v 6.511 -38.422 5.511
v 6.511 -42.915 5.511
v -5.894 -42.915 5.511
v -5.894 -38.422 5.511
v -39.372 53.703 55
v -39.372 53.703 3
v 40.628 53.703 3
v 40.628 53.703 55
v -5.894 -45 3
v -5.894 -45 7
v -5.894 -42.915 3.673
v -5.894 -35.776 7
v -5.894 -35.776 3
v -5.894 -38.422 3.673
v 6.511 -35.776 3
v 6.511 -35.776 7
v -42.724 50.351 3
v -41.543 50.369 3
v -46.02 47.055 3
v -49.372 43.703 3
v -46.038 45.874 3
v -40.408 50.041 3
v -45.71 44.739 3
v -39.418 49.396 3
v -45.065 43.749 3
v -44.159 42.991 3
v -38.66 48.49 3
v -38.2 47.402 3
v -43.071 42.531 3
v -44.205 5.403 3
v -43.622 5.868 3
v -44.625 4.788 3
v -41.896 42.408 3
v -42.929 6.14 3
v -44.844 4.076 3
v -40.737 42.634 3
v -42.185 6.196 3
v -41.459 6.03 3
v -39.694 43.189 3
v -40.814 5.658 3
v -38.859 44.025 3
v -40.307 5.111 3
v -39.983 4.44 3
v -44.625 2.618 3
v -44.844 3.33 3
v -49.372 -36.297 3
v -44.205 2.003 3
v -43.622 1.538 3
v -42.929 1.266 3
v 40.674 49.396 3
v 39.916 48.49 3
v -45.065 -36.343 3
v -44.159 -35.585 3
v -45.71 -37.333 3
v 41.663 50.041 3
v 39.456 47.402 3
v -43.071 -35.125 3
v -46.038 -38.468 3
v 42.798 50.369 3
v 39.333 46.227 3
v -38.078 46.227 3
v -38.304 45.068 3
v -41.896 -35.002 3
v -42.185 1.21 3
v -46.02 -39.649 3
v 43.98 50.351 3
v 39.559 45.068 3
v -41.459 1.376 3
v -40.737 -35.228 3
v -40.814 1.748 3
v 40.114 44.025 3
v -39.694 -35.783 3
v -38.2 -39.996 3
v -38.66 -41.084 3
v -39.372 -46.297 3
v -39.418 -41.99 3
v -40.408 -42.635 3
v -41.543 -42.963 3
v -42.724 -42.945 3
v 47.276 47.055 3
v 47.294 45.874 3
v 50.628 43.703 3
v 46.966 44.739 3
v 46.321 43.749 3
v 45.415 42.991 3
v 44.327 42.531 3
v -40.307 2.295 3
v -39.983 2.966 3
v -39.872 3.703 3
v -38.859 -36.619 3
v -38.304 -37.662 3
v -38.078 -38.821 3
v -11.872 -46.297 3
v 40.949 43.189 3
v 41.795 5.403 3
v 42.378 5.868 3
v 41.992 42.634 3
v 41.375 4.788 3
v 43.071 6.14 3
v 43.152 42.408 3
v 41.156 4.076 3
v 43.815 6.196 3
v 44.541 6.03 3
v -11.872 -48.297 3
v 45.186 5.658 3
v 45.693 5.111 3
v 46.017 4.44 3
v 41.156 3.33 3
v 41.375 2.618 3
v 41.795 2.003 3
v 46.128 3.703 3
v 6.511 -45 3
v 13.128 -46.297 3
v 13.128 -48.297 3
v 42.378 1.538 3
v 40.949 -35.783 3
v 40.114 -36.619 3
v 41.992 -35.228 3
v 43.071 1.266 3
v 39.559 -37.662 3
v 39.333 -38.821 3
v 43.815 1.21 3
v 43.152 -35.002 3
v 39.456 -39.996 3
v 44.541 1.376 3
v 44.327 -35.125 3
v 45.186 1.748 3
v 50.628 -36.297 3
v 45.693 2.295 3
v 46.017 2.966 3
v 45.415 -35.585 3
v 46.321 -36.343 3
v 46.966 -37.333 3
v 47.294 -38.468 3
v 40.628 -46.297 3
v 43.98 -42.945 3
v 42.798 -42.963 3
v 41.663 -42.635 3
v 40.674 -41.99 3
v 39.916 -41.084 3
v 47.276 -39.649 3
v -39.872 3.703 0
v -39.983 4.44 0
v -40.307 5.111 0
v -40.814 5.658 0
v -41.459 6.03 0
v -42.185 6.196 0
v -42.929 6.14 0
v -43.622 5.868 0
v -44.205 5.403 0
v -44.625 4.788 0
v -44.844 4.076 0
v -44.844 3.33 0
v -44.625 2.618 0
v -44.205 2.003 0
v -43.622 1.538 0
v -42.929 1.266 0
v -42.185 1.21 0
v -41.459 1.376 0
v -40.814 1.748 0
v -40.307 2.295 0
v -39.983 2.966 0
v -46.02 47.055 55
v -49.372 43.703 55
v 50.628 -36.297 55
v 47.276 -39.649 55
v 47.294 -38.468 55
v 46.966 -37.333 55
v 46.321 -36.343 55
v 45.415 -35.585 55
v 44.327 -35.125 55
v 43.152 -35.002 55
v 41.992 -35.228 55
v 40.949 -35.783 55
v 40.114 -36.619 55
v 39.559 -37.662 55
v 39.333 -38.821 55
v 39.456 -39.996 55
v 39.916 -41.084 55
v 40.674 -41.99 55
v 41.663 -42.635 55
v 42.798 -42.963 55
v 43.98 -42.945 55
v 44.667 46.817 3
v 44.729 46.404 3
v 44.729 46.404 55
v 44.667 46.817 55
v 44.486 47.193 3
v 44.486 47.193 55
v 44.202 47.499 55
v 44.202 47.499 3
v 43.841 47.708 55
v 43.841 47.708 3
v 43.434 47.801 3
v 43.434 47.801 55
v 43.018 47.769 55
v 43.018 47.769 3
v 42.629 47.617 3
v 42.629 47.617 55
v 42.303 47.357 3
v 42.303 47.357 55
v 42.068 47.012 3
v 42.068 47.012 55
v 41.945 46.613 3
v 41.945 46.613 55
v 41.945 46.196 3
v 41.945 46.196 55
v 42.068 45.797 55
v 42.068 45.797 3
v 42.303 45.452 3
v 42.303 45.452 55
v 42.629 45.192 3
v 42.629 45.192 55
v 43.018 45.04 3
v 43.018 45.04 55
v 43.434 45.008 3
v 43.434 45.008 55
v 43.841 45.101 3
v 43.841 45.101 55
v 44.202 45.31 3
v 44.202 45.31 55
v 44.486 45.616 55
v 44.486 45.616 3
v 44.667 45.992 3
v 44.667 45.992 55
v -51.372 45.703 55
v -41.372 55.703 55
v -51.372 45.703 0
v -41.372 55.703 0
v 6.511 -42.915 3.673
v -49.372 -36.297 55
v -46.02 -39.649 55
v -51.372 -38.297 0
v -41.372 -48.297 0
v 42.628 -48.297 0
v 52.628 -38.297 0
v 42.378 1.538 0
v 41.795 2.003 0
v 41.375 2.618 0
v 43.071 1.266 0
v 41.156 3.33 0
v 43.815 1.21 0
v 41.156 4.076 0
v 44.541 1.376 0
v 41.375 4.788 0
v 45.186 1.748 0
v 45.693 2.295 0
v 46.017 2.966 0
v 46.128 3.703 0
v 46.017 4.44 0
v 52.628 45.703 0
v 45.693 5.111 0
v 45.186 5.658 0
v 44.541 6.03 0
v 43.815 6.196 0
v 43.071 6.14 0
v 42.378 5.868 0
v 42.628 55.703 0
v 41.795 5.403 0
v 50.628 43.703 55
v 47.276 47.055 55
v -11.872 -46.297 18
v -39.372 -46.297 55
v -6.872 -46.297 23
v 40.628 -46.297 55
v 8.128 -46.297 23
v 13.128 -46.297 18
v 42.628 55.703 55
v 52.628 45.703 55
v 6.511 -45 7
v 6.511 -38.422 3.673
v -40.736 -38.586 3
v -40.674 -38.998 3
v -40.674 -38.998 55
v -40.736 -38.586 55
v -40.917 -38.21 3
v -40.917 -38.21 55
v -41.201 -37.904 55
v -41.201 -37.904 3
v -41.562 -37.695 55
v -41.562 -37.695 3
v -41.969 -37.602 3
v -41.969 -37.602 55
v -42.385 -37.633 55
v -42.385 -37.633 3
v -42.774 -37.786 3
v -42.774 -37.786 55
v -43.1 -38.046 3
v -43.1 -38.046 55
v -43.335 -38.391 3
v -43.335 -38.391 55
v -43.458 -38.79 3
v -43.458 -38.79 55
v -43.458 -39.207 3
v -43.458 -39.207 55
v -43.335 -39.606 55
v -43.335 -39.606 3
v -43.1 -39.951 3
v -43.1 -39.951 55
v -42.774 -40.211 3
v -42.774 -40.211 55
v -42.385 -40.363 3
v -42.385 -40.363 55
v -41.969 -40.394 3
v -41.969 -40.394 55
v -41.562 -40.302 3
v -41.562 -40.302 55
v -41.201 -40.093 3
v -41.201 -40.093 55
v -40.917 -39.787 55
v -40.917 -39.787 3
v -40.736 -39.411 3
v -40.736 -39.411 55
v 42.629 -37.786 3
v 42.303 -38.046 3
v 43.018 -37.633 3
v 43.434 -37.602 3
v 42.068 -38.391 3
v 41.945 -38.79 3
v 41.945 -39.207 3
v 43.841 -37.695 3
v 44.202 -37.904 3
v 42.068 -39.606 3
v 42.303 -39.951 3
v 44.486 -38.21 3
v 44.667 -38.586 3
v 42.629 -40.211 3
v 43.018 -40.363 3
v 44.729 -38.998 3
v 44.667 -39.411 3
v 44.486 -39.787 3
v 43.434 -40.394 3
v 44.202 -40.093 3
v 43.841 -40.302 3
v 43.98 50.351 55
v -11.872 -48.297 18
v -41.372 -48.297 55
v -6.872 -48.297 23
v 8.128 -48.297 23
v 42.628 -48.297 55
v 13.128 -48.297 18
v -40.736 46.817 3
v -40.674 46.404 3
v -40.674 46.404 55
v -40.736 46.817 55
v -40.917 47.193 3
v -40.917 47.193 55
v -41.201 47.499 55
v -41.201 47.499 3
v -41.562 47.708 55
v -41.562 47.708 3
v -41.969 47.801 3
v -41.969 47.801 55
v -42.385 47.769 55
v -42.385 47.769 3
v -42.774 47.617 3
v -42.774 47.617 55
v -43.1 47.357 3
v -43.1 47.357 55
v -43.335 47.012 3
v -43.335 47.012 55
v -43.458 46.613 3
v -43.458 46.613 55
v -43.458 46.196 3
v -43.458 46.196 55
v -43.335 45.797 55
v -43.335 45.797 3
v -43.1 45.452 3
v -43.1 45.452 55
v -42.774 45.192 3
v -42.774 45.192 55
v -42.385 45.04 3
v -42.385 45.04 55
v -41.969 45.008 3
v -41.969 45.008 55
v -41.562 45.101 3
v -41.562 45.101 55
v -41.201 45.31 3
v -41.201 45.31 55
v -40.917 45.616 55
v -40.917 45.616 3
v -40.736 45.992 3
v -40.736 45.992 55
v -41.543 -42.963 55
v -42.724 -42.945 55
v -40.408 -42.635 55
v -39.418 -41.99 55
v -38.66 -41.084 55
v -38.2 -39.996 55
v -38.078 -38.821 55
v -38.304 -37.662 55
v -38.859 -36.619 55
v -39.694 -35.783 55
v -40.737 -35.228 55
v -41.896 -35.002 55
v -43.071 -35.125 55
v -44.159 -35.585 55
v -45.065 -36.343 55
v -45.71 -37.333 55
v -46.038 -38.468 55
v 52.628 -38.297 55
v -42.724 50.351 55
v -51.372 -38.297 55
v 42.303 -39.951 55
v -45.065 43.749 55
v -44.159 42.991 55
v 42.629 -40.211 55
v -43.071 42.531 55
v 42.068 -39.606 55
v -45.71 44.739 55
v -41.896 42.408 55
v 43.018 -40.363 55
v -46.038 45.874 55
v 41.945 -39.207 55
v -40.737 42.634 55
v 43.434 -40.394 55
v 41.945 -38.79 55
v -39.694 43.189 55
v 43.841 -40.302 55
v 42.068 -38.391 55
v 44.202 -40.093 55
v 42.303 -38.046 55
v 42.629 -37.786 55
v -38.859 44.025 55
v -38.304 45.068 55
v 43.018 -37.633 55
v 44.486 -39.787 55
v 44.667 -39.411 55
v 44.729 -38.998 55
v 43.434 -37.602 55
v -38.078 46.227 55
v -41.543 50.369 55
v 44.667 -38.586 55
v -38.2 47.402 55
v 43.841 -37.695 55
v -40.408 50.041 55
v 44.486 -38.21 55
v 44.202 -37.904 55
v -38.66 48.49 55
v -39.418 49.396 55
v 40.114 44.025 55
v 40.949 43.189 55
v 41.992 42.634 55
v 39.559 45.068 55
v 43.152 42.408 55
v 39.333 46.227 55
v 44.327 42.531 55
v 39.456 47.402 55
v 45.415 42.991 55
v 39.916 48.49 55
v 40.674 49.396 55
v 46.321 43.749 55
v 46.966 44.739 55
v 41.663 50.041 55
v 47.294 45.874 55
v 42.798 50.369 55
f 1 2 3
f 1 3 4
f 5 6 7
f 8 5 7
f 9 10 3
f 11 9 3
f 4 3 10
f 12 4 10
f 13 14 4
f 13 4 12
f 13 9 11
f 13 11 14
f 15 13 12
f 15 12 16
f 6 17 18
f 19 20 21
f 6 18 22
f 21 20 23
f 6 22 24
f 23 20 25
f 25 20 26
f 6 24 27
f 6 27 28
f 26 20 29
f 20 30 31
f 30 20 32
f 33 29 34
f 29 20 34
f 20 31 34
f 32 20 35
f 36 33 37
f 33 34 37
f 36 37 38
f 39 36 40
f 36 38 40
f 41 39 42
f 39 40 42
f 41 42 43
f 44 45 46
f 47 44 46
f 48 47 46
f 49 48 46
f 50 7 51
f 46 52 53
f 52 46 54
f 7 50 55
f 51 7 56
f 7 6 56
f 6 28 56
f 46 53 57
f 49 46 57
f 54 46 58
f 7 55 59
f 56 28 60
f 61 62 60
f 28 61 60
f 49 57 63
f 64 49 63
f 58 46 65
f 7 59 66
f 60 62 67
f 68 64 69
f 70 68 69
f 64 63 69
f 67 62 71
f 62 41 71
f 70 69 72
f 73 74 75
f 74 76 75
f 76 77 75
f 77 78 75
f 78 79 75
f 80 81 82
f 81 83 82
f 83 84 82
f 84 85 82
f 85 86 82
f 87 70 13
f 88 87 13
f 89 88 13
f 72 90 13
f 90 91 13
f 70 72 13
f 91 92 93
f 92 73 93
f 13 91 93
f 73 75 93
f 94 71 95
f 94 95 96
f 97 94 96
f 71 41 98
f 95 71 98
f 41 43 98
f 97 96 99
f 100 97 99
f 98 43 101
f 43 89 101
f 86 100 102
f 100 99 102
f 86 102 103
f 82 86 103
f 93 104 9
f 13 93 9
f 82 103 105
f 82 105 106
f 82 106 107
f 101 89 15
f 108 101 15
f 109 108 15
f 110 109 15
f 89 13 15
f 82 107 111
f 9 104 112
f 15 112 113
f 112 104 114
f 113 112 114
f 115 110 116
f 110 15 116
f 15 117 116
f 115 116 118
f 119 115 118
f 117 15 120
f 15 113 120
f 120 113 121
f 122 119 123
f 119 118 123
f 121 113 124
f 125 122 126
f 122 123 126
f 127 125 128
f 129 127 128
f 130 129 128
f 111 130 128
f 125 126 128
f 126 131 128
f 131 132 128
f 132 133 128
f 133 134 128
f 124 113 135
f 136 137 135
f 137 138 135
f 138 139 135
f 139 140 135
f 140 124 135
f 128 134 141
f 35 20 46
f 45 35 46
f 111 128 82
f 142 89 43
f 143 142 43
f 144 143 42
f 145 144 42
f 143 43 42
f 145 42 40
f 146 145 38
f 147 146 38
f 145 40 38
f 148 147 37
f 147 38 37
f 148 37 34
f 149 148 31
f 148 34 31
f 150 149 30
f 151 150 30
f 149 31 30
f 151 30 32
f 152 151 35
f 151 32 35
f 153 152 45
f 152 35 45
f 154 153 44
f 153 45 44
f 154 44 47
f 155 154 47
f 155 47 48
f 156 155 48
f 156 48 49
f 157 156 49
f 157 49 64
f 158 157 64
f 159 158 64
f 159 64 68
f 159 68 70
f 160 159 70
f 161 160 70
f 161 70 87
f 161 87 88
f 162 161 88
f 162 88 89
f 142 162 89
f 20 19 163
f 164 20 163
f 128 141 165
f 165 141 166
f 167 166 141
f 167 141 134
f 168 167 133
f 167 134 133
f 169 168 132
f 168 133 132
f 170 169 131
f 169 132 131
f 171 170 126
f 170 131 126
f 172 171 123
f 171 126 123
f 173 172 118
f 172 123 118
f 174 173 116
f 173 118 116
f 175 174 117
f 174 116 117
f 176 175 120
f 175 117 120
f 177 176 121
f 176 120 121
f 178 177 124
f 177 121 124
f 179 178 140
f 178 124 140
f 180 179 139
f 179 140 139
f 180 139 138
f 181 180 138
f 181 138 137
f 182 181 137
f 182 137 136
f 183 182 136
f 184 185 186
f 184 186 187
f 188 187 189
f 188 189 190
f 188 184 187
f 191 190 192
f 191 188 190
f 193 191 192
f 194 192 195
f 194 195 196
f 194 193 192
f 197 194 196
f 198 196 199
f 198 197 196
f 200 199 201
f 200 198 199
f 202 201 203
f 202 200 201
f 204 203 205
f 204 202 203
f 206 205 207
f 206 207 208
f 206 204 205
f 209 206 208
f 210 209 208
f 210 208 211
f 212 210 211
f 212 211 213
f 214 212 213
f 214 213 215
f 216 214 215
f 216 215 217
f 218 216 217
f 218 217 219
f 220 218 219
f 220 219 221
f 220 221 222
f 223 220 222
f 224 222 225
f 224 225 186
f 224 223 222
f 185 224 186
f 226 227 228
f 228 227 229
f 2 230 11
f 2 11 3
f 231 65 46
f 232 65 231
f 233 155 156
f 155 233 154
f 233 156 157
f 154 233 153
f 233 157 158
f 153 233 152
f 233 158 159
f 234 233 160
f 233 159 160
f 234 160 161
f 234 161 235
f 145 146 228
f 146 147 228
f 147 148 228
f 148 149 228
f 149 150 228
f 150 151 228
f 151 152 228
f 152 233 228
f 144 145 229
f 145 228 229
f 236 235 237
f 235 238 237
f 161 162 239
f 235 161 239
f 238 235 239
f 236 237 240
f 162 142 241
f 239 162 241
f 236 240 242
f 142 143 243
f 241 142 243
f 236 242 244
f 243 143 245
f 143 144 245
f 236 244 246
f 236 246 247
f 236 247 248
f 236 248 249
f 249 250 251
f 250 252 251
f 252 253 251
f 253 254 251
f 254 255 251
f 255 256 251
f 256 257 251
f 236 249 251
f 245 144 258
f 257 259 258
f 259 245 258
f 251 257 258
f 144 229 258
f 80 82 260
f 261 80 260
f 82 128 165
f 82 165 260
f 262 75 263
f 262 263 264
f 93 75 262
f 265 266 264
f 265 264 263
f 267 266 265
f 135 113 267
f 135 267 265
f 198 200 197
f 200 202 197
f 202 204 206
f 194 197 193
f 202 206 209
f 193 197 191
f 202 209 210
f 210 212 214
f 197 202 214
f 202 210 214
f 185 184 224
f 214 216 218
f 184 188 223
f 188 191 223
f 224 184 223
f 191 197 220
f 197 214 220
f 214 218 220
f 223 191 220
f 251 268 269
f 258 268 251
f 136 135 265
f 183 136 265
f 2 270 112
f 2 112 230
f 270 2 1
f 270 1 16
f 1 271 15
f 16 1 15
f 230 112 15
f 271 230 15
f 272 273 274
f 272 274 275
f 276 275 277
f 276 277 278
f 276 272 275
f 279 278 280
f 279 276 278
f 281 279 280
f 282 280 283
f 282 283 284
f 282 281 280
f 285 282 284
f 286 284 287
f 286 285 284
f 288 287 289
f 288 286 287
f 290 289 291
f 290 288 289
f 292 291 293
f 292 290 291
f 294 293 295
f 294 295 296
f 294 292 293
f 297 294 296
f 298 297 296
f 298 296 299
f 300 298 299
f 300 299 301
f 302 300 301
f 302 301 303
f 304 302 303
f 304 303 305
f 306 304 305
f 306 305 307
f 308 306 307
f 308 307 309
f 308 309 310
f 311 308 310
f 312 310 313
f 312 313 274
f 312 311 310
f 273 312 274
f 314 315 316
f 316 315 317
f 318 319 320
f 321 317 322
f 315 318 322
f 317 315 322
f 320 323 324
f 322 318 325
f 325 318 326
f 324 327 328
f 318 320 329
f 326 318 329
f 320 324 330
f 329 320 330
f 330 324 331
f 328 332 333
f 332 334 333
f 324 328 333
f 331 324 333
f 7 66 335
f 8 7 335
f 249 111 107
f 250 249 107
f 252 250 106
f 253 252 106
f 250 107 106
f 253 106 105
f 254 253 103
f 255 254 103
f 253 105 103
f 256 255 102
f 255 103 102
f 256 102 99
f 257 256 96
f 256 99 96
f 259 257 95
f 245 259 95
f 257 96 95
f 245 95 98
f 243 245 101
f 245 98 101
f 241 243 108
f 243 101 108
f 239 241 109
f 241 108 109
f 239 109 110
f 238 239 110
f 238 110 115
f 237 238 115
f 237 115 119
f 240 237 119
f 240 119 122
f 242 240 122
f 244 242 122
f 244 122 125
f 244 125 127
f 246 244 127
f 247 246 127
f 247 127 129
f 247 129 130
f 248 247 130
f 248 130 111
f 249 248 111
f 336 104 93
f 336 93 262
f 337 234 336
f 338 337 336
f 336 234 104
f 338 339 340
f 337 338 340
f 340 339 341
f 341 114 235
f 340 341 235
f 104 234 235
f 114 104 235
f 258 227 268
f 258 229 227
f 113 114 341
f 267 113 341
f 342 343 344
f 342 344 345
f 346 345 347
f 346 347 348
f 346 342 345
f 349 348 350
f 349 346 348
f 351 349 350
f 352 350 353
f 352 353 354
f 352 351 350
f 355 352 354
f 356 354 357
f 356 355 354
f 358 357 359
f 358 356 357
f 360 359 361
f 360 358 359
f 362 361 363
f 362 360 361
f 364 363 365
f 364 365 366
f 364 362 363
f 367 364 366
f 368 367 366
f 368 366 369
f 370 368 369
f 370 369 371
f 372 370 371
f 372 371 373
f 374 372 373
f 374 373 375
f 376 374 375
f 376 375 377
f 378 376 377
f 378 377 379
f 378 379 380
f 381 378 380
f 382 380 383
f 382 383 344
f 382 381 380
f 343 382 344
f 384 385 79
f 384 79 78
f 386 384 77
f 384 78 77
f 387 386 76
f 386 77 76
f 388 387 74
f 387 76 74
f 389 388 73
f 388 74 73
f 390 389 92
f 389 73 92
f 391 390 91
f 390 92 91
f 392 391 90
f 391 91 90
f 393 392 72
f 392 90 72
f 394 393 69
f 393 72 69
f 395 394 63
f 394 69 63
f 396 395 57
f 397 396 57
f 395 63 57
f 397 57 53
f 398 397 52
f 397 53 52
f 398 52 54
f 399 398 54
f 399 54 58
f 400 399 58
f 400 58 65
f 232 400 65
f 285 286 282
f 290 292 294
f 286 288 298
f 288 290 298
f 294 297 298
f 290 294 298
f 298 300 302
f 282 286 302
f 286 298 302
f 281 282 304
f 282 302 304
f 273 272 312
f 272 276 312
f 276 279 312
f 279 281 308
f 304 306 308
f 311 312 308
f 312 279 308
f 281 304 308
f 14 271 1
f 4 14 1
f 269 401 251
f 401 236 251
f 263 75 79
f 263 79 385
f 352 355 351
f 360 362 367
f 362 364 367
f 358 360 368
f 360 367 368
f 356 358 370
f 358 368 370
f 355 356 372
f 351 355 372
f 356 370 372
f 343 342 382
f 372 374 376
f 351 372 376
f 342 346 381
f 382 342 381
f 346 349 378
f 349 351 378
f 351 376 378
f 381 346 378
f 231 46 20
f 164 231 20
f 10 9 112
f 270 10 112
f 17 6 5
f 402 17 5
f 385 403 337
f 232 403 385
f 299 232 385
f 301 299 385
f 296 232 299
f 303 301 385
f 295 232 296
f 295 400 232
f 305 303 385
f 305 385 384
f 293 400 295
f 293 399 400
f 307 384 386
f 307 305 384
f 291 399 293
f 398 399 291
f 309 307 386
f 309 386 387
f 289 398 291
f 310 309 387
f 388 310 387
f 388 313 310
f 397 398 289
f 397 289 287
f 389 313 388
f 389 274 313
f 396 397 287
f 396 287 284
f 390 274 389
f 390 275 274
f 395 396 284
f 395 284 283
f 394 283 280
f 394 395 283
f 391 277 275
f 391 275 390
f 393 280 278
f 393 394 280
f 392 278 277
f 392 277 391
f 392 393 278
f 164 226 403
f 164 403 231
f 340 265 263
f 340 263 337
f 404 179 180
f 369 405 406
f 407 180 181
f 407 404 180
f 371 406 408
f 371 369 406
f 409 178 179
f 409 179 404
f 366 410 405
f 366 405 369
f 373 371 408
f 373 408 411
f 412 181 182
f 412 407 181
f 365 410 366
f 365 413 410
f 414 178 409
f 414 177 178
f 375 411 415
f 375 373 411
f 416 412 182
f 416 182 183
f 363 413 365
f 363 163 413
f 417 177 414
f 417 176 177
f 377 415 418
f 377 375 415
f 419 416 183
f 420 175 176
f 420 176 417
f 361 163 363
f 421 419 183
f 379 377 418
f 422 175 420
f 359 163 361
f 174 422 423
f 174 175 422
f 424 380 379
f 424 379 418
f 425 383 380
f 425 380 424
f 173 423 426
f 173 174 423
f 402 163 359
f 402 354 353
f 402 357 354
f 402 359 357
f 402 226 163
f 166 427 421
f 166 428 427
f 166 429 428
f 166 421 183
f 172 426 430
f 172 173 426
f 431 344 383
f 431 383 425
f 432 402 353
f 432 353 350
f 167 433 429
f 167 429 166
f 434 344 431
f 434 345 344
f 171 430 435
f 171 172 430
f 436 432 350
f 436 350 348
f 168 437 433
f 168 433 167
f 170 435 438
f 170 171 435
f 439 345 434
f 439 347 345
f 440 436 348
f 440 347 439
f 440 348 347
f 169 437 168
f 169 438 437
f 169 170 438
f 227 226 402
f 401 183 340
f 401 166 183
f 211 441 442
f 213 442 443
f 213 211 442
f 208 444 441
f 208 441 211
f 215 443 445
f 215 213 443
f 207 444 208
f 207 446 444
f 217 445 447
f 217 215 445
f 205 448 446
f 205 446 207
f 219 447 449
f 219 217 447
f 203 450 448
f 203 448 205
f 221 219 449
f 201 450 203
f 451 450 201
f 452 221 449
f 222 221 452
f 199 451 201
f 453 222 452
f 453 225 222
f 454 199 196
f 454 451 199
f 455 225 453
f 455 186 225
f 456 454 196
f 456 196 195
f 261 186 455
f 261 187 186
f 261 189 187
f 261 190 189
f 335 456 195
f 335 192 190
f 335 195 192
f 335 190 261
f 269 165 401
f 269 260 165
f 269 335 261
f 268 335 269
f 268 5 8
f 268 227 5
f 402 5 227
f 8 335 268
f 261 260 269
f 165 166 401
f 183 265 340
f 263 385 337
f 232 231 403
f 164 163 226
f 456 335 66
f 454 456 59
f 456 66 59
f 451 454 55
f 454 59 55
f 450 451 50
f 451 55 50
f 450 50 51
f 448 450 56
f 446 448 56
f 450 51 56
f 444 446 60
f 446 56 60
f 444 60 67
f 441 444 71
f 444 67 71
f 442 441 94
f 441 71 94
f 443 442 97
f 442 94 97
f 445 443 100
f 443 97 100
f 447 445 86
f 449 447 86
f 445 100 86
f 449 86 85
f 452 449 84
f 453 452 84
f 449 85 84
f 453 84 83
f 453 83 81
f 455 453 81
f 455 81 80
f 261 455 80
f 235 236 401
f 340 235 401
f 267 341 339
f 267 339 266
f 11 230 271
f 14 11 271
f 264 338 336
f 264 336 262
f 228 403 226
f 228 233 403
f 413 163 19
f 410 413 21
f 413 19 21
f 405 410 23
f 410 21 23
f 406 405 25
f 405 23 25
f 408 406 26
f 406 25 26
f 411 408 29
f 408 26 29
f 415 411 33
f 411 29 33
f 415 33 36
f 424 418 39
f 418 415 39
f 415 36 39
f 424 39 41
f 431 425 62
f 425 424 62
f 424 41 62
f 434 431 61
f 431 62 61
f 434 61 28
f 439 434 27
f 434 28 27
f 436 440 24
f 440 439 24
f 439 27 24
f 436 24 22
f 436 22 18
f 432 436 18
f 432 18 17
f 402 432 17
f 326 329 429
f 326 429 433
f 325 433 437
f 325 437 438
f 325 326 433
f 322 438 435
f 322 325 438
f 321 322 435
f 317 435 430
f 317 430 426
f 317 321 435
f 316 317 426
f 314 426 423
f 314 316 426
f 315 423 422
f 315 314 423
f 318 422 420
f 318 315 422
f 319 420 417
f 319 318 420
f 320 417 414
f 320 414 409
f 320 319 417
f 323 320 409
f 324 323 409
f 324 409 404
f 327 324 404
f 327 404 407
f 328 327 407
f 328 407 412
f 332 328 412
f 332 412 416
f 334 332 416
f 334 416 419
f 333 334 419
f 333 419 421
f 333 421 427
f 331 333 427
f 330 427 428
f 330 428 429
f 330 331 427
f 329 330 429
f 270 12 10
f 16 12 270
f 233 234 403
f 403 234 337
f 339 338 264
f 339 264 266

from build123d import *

# Parameters (mm, degrees)
SKETCH_W        = 104
SKETCH_H        = 104
PAD_DEPTH       = 3
SKETCH001_W     = 104
SKETCH001_H     = 104
SKETCH001_W_2   = 100
SKETCH001_H_2   = 100
PAD001_DEPTH    = 52
CHAMFER_SIZE    = 10
SKETCH003_W     = 25
SKETCH003_H     = 20
POCKET_DEPTH    = 5
CHAMFER001_SIZE = 5
SKETCH004_W     = 12.404821
SKETCH004_H     = 9.224227
PAD002_DEPTH    = 4
SKETCH005_R     = 4
SKETCH005_R_2   = 1.4
PAD003_DEPTH    = 52
SKETCH002_R     = 2.5
POCKET001_DEPTH = 5
SKETCH006_W     = 4.492853
SKETCH006_H     = 1.837998
POCKET002_DEPTH = 25


with BuildPart() as part:
    # Sketch → Pad (new body)
    with BuildSketch(Plane.XY):
        with Locations((0.627717, 3.703031)):
            Rectangle(SKETCH_W, SKETCH_H)
    extrude(amount=PAD_DEPTH)

    # Sketch001 → Pad001 (new body)
    with BuildSketch(Plane.XY.offset(3)):
        with Locations((0.627717, 3.703031)):
            Rectangle(SKETCH001_W, SKETCH001_H)
        with Locations((0.627717, 3.703031)):
            Rectangle(SKETCH001_W_2, SKETCH001_H_2, mode=Mode.SUBTRACT)
    extrude(amount=PAD001_DEPTH)

    # Chamfer
    chamfer_edges = [part.edges().sort_by_distance(p)[0] for p in [
        (-51.372283, 55.703031, 27.5),
        (52.627717, 55.703031, 27.5),
        (-51.372283, -48.296969, 27.5),
        (52.627717, -48.296969, 27.5),
        (-49.372283, 53.703031, 29),
        (50.627717, 53.703031, 29),
        (-49.372283, -46.296969, 29),
        (50.627717, -46.296969, 29),
    ]]
    chamfer(chamfer_edges, length=CHAMFER_SIZE)

    # Sketch003 → Pocket (cut)
    with BuildSketch(Plane.XZ.offset(48.296969)):
        with Locations((0.627717, 13)):
            Rectangle(SKETCH003_W, SKETCH003_H)
    extrude(amount=-POCKET_DEPTH, mode=Mode.SUBTRACT)

    # Chamfer001
    chamfer001_edges = [part.edges().sort_by_distance(p)[0] for p in [
        (-11.872283, -47.296969, 23),
        (13.127717, -47.296969, 23),
    ]]
    chamfer(chamfer001_edges, length=CHAMFER001_SIZE)

    # Sketch004 → Pad002 (new body)
    with BuildSketch(Plane.XY.offset(3)):
        with Locations((0.308178, -40.387887)):
            Rectangle(SKETCH004_W, SKETCH004_H)
    extrude(amount=PAD002_DEPTH)

    # Sketch005 → Pad003 (new body)
    with BuildSketch(Plane.XY.offset(3)):
        with Locations((-42.073699, 46.404447)):
            Circle(SKETCH005_R)
        with Locations((-42.073699, 46.404447)):
            Circle(SKETCH005_R_2, mode=Mode.SUBTRACT)
        with Locations((43.329133, 46.404447)):
            Circle(SKETCH005_R)
        with Locations((43.329133, 46.404447)):
            Circle(SKETCH005_R_2, mode=Mode.SUBTRACT)
        with Locations((-42.073699, -38.998385)):
            Circle(SKETCH005_R)
        with Locations((-42.073699, -38.998385)):
            Circle(SKETCH005_R_2, mode=Mode.SUBTRACT)
        with Locations((43.329133, -38.998385)):
            Circle(SKETCH005_R)
        with Locations((43.329133, -38.998385)):
            Circle(SKETCH005_R_2, mode=Mode.SUBTRACT)
    extrude(amount=PAD003_DEPTH)

    # Sketch002 → Pocket001 (cut)
    with BuildSketch(Plane.XY.offset(3)):
        with Locations((-42.372283, 3.703031)):
            Circle(SKETCH002_R)
        with Locations((43.627717, 3.703031)):
            Circle(SKETCH002_R)
    extrude(amount=-POCKET001_DEPTH, mode=Mode.SUBTRACT)

    # Sketch006 → Pocket002 (cut)
    with BuildSketch(Plane.YZ.offset(6.510589)):
        with Locations((-40.668302, 4.592406)):
            Rectangle(SKETCH006_W, SKETCH006_H)
    extrude(amount=-POCKET002_DEPTH, mode=Mode.SUBTRACT)


solid = part.part
